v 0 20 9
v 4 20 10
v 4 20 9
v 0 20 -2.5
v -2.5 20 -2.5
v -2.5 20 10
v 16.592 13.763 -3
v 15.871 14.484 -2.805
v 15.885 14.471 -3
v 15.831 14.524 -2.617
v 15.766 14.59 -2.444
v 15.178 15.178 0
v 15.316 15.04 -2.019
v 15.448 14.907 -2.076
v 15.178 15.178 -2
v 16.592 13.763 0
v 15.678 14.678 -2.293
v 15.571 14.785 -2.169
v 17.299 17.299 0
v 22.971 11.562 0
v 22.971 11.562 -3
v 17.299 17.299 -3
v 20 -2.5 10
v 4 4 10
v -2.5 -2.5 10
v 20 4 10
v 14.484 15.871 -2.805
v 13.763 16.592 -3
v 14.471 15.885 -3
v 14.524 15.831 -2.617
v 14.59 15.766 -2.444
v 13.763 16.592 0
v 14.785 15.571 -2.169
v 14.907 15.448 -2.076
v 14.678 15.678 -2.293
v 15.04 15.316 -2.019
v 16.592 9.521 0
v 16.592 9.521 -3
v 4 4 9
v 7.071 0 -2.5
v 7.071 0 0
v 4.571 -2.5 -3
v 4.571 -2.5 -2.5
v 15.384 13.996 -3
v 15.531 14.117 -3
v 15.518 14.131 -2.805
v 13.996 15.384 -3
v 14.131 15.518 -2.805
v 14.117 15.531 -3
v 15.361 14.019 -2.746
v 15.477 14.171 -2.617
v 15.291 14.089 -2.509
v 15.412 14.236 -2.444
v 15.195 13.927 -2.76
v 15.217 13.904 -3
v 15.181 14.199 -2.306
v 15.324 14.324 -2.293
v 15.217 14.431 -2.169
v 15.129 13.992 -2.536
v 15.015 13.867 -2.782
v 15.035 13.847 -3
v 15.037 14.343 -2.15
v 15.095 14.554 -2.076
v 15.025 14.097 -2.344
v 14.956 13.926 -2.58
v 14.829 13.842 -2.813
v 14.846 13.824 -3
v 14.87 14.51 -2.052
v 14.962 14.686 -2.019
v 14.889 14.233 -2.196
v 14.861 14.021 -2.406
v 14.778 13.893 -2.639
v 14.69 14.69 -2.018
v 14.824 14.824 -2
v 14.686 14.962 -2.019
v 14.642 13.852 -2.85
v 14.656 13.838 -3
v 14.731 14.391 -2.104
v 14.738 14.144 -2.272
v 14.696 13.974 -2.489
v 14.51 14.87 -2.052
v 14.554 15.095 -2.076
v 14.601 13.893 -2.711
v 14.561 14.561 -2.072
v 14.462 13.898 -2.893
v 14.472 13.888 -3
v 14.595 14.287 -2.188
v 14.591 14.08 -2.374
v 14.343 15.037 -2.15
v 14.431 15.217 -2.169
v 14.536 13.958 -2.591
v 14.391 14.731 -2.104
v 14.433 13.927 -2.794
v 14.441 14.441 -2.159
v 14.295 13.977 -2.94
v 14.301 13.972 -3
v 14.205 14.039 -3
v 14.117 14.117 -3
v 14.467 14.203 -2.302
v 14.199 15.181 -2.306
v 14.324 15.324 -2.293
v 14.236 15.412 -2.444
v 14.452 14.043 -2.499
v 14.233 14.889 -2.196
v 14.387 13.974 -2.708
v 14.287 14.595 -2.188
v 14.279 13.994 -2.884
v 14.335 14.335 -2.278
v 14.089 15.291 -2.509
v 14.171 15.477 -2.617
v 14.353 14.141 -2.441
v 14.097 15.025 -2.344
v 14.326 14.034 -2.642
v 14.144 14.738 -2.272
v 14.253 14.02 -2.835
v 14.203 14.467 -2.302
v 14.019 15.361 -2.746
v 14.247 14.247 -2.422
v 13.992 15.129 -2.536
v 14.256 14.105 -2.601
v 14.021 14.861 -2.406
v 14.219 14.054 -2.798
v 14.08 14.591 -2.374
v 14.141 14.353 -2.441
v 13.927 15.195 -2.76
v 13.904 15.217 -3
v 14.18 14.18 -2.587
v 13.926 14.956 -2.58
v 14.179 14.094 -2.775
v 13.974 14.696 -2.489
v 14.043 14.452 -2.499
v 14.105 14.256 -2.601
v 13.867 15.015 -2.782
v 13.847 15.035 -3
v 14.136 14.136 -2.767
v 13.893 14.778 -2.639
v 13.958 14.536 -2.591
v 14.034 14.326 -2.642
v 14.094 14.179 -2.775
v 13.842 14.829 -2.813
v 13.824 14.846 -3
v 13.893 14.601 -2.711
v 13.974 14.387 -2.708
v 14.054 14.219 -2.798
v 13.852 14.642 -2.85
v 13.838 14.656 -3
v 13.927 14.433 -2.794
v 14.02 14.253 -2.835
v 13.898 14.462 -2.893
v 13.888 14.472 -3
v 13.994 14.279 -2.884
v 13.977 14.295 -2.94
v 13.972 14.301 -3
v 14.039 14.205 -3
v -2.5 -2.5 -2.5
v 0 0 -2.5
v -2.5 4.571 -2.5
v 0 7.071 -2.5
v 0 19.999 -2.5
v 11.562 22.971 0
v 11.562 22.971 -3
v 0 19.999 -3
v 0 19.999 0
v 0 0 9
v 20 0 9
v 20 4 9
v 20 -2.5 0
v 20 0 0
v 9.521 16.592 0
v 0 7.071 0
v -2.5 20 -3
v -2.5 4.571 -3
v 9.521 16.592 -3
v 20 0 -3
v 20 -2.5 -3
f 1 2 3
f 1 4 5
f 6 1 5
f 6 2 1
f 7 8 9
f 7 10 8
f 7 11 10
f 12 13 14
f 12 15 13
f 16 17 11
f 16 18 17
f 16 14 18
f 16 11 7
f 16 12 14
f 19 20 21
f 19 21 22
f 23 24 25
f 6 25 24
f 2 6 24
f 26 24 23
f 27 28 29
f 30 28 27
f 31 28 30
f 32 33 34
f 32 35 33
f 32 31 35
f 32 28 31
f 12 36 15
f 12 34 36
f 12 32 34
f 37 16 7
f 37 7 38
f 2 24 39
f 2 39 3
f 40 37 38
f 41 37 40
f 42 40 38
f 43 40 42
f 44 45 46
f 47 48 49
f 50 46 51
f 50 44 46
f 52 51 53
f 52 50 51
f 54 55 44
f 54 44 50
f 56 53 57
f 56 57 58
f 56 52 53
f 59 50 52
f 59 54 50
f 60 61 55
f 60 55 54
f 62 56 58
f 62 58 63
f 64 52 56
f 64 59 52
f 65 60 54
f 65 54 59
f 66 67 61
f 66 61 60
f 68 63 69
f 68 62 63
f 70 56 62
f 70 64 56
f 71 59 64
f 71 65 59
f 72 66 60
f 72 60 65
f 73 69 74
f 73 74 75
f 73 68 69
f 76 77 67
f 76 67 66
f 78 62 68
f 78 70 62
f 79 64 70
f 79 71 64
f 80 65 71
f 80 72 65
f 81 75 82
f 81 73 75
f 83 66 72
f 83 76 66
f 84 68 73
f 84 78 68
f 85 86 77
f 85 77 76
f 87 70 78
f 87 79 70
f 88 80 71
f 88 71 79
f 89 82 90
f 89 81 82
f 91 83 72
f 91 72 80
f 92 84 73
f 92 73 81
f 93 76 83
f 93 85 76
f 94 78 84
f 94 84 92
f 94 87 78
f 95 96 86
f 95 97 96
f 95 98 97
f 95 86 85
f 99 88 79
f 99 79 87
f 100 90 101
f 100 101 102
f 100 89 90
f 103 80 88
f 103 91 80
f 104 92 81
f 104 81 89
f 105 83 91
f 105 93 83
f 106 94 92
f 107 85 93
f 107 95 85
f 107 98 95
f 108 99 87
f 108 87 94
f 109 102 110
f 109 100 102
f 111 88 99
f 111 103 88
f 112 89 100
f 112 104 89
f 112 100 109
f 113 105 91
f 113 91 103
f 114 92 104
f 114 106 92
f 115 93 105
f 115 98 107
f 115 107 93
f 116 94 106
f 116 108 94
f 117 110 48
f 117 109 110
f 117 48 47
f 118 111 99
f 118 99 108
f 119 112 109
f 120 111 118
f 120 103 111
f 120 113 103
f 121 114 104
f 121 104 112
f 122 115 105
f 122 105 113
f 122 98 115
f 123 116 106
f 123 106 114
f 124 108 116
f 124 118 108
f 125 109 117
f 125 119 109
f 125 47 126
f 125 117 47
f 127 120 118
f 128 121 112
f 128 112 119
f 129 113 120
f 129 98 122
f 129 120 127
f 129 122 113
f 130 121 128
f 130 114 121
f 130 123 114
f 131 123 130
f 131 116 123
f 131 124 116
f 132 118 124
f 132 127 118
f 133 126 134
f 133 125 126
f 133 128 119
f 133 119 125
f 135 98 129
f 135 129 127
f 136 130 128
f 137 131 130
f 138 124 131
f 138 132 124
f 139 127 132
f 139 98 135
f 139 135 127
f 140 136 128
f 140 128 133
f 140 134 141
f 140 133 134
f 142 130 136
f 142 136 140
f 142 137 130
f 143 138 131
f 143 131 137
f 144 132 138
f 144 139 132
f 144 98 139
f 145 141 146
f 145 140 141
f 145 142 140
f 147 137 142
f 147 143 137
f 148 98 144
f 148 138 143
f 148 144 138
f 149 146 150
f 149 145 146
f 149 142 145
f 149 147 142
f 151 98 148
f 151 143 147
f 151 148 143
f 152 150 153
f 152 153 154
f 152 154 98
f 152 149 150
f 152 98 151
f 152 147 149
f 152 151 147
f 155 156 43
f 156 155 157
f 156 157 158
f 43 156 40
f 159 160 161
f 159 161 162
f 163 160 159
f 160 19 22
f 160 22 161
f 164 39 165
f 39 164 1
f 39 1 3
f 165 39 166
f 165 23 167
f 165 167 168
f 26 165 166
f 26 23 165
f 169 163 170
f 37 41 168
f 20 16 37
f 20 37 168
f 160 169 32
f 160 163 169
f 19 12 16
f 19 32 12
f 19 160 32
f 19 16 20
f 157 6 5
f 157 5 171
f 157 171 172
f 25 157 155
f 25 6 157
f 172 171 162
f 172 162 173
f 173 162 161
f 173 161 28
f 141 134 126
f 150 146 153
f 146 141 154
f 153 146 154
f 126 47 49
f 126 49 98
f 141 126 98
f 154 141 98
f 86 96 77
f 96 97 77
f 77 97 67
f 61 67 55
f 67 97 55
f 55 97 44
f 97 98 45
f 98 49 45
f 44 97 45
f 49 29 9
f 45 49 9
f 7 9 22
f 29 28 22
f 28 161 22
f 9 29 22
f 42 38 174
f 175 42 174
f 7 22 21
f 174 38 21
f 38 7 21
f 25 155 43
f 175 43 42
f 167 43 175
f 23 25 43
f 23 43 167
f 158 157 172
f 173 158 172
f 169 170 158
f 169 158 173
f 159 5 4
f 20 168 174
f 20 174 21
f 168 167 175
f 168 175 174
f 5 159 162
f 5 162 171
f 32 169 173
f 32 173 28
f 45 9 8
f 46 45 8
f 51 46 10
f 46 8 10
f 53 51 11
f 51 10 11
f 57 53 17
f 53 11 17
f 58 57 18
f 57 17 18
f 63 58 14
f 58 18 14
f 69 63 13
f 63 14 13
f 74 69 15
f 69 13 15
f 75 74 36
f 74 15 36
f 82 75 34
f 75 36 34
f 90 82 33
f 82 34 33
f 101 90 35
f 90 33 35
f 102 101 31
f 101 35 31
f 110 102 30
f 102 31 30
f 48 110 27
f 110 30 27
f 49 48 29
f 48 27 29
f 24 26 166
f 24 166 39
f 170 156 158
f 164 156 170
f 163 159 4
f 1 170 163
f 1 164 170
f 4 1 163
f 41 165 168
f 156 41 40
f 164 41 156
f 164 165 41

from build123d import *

# Parameters (mm, degrees)
F2_DEPTH  = 6
F4_DEPTH  = 3
F5_DEPTH  = 6.5
F7_DEPTH  = 1.5
F8_R      = 0.99999
F10_DEPTH = 1


# Not quite as in the source:
# - a fillet or chamfer is up to 0.001 mm smaller than in the source, because OpenCascade refuses the exact size


with BuildPart() as f2:
    # F1 (on offset) → F2 (new body)
    with BuildSketch(Plane.XY.offset(4)):
        Polygon((20, 0), (0, 0), (0, 20), (-2.5, 20), (-2.5, -2.5), (20, -2.5), align=None)
    extrude(amount=F2_DEPTH)



with BuildPart() as f4:
    # F3 (on Top) → F4 (new body)
    with BuildSketch(Plane.XY):
        Polygon((16.591883092, 13.7634559673), (16.591883092, 9.5208152802), (4.5710678119, -2.5), (8.75, -2.5), (22.9713253162, 11.5625), (17.2989898732, 17.2989898732), (15.1776695297, 15.1776695297), align=None)
        Polygon((22.9713253162, 11.5625), (8.75, -2.5), (20, -2.5), (20.0004931539, 0), align=None)
        Polygon((13.7634559673, 16.591883092), (15.1776695297, 15.1776695297), (17.2989898732, 17.2989898732), (11.5625, 22.9713253162), (-2.5, 8.75), (-2.5, 4.5710678119), (9.5208152802, 16.591883092), align=None)
        Polygon((-2.5, 8.75), (11.5625, 22.9713253162), (0, 19.9992582202), (-2.5, 20), align=None)
    extrude(amount=-F4_DEPTH)


with BuildPart() as f2_1:
    add(f2.part)

    add(f4.part)  # F5 merges F4
    # F1 (on offset) → F5 (join)
    with BuildSketch(Plane.XY.offset(4)):
        Polygon((20, 0), (0, 0), (0, 20), (-2.5, 20), (-2.5, -2.5), (20, -2.5), align=None)
    extrude(amount=-F5_DEPTH)

    # F6 (on face) → F7 (join)
    with BuildSketch(Plane(origin=(15.1776695297, 15.1776695297, 0), x_dir=(0.7071067812, -0.7071067812, 0), z_dir=(-0.7071067812, -0.7071067812, 0))):
        with BuildLine():
            Line((-1, -3), (1, -3))
            ThreePointArc((1, -3), (0, -2), (-1, -3))
        make_face()
    extrude(amount=F7_DEPTH)

    # F8 (radius 1 in the source; OpenCascade refuses exactly that, so slightly less here)
    f8_edges = [f2_1.edges().sort_by_distance(p)[0] for p in [
        (14.117009, 14.117009, -2),
    ]]
    fillet(f8_edges, radius=F8_R)

    # F9 (on face) → F10 (join)
    with BuildSketch(Plane.XY.offset(10)):
        Polygon((4, 20), (-2.5, 20), (-2.5, -2.5), (20, -2.5), (20, 4), (4, 4), align=None)
    extrude(amount=-F10_DEPTH)


solid = f2_1.part
